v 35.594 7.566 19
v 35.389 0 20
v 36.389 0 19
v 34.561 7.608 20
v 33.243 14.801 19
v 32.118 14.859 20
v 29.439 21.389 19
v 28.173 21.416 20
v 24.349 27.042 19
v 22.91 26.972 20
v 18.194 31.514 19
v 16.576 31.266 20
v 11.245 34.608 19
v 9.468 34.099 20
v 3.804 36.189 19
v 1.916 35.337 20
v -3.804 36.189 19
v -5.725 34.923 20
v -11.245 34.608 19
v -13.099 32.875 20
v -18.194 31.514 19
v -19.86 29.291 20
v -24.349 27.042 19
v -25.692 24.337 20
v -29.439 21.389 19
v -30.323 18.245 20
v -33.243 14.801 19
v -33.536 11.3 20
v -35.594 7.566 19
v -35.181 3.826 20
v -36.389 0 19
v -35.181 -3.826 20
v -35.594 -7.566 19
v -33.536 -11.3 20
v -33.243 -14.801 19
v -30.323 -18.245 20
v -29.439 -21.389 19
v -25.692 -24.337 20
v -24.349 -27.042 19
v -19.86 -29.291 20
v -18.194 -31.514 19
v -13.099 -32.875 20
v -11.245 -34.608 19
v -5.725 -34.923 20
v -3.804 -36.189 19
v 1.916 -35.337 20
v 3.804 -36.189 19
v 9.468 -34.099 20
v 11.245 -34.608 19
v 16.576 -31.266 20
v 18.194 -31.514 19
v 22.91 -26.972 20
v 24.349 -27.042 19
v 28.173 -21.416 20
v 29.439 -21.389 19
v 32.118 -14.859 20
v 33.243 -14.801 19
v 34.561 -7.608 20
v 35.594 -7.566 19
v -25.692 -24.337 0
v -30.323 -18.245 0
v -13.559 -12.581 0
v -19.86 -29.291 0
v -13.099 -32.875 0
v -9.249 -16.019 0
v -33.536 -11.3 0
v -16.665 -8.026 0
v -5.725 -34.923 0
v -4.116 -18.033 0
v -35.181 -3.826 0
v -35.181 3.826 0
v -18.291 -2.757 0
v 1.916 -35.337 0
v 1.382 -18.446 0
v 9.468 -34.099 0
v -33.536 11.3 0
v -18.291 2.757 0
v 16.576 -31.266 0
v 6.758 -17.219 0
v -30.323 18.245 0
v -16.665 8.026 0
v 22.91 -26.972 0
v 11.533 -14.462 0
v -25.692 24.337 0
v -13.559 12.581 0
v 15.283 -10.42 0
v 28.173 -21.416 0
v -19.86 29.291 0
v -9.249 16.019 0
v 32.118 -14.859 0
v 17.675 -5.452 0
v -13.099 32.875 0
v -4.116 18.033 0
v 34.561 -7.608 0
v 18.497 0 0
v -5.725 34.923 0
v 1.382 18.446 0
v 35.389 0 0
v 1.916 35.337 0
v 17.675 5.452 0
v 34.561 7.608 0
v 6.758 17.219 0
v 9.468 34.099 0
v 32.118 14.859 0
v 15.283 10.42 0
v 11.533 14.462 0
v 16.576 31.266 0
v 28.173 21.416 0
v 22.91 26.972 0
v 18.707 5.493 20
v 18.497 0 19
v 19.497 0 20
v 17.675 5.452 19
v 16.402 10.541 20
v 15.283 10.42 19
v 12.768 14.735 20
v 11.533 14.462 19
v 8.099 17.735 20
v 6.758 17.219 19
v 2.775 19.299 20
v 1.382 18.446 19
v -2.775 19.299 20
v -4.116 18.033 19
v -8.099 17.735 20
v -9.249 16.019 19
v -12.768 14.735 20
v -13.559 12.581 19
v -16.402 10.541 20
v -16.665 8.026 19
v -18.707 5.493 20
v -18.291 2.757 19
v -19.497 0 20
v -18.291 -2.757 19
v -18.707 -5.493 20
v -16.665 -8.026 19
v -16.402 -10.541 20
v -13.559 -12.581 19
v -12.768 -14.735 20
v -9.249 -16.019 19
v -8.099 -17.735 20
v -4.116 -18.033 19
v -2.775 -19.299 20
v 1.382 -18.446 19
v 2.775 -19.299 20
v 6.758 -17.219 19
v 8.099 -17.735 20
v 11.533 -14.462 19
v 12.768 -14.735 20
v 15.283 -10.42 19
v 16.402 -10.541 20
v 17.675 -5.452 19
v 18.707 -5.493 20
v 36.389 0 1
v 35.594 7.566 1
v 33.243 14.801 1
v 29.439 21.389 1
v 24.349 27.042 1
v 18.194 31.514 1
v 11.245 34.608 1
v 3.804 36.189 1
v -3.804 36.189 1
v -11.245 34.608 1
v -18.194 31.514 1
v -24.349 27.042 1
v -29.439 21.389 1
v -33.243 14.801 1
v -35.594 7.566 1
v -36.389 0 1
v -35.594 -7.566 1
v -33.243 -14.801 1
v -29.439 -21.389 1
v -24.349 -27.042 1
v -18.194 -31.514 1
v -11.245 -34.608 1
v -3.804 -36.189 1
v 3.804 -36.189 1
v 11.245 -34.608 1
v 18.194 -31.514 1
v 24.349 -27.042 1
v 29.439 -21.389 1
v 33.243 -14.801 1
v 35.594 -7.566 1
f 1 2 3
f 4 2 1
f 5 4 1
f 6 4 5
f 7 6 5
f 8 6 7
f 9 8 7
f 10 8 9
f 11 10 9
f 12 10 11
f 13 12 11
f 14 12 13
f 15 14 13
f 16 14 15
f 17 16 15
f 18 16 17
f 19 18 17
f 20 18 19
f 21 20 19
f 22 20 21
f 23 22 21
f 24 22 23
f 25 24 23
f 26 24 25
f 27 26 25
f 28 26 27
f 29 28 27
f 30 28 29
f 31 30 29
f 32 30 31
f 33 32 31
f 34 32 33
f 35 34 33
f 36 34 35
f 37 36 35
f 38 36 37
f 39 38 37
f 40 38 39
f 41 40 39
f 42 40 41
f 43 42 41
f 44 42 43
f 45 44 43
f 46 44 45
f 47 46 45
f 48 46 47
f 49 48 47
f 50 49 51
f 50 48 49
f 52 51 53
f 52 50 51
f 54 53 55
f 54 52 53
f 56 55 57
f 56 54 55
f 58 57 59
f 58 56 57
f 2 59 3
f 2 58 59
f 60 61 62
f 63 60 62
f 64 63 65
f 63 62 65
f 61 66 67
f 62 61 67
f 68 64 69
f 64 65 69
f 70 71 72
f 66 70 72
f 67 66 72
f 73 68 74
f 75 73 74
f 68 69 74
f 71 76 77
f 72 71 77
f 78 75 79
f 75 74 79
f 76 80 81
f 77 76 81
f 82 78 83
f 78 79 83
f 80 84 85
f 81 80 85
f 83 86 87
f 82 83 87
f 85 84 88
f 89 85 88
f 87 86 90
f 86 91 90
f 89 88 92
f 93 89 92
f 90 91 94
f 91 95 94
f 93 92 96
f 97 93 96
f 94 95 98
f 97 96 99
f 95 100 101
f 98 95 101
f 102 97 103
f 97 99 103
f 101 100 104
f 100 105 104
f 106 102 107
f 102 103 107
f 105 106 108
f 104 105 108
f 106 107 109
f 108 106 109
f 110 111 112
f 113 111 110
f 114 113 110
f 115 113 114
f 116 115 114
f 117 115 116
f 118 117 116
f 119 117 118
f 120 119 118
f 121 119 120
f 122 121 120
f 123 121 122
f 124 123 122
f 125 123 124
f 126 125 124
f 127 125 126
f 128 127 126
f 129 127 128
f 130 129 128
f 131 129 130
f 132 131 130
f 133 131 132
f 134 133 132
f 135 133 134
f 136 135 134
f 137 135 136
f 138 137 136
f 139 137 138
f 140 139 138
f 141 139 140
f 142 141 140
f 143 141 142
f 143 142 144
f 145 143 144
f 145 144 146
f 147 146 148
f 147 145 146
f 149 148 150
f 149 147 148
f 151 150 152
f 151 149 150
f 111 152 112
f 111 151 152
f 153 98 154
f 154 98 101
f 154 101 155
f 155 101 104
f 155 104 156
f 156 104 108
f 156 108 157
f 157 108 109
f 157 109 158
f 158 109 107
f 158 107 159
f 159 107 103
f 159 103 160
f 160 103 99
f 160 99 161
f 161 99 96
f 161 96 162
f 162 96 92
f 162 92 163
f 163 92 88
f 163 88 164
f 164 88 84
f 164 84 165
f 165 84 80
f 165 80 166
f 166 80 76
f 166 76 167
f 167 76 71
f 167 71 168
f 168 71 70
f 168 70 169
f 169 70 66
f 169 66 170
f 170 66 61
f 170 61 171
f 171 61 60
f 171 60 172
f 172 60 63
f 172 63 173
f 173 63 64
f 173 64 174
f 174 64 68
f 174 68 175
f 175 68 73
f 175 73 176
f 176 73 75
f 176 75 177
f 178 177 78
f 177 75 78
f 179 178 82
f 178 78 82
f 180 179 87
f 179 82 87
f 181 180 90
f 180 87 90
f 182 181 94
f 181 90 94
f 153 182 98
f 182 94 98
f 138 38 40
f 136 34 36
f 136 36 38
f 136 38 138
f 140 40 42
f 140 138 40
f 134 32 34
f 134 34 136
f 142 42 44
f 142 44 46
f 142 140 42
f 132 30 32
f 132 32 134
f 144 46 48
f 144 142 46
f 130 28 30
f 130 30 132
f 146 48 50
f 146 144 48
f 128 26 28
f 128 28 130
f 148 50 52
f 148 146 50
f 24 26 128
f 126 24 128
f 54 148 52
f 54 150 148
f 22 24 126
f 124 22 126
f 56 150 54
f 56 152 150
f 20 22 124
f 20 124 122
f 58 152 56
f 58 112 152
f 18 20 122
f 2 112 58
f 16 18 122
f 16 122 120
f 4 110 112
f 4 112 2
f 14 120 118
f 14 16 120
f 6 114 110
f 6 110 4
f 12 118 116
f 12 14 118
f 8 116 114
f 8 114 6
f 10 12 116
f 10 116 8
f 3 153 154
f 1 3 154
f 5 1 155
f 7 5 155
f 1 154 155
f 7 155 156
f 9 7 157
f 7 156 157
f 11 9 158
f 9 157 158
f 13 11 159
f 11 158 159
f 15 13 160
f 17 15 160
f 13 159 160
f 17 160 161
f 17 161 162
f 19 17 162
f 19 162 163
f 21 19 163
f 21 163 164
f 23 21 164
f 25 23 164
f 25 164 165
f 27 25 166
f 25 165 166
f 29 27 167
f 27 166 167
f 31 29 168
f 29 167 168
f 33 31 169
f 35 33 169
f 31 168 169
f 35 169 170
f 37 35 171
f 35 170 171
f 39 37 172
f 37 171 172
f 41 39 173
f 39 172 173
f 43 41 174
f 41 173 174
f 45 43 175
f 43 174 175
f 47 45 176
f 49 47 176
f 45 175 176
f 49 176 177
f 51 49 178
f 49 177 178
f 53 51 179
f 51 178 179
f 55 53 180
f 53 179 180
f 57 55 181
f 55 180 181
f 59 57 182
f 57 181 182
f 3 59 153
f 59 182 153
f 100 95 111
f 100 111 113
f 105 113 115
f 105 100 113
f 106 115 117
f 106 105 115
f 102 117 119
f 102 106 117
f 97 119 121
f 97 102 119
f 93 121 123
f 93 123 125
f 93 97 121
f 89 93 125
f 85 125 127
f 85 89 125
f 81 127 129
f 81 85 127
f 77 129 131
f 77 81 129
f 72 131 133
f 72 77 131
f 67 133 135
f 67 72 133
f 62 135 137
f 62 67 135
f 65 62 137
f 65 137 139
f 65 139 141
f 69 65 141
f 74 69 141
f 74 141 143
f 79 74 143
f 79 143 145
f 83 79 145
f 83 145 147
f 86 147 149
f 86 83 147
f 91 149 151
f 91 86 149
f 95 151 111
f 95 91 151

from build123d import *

# Parameters (mm, degrees)
F1_R     = 36.388832
F1_R_2   = 18.497226
F2_DEPTH = 20
F3_SIZE  = 1
F4_SIZE  = 1


with BuildPart() as f2:
    # F1 (on face) → F2 (new body)
    with BuildSketch(Plane.XY):
        Circle(F1_R)
        Circle(F1_R_2, mode=Mode.SUBTRACT)
    extrude(amount=F2_DEPTH)

    # F3
    f3_edges = [f2.edges().sort_by_distance(p)[0] for p in [
        (-36.388832, 0, 20),
        (-36.388832, 0, 0),
    ]]
    chamfer(f3_edges, length=F3_SIZE)

    # F4
    f4_edges = [f2.edges().sort_by_distance(p)[0] for p in [
        (-18.497226, 0, 20),
    ]]
    chamfer(f4_edges, length=F4_SIZE)


solid = f2.part
